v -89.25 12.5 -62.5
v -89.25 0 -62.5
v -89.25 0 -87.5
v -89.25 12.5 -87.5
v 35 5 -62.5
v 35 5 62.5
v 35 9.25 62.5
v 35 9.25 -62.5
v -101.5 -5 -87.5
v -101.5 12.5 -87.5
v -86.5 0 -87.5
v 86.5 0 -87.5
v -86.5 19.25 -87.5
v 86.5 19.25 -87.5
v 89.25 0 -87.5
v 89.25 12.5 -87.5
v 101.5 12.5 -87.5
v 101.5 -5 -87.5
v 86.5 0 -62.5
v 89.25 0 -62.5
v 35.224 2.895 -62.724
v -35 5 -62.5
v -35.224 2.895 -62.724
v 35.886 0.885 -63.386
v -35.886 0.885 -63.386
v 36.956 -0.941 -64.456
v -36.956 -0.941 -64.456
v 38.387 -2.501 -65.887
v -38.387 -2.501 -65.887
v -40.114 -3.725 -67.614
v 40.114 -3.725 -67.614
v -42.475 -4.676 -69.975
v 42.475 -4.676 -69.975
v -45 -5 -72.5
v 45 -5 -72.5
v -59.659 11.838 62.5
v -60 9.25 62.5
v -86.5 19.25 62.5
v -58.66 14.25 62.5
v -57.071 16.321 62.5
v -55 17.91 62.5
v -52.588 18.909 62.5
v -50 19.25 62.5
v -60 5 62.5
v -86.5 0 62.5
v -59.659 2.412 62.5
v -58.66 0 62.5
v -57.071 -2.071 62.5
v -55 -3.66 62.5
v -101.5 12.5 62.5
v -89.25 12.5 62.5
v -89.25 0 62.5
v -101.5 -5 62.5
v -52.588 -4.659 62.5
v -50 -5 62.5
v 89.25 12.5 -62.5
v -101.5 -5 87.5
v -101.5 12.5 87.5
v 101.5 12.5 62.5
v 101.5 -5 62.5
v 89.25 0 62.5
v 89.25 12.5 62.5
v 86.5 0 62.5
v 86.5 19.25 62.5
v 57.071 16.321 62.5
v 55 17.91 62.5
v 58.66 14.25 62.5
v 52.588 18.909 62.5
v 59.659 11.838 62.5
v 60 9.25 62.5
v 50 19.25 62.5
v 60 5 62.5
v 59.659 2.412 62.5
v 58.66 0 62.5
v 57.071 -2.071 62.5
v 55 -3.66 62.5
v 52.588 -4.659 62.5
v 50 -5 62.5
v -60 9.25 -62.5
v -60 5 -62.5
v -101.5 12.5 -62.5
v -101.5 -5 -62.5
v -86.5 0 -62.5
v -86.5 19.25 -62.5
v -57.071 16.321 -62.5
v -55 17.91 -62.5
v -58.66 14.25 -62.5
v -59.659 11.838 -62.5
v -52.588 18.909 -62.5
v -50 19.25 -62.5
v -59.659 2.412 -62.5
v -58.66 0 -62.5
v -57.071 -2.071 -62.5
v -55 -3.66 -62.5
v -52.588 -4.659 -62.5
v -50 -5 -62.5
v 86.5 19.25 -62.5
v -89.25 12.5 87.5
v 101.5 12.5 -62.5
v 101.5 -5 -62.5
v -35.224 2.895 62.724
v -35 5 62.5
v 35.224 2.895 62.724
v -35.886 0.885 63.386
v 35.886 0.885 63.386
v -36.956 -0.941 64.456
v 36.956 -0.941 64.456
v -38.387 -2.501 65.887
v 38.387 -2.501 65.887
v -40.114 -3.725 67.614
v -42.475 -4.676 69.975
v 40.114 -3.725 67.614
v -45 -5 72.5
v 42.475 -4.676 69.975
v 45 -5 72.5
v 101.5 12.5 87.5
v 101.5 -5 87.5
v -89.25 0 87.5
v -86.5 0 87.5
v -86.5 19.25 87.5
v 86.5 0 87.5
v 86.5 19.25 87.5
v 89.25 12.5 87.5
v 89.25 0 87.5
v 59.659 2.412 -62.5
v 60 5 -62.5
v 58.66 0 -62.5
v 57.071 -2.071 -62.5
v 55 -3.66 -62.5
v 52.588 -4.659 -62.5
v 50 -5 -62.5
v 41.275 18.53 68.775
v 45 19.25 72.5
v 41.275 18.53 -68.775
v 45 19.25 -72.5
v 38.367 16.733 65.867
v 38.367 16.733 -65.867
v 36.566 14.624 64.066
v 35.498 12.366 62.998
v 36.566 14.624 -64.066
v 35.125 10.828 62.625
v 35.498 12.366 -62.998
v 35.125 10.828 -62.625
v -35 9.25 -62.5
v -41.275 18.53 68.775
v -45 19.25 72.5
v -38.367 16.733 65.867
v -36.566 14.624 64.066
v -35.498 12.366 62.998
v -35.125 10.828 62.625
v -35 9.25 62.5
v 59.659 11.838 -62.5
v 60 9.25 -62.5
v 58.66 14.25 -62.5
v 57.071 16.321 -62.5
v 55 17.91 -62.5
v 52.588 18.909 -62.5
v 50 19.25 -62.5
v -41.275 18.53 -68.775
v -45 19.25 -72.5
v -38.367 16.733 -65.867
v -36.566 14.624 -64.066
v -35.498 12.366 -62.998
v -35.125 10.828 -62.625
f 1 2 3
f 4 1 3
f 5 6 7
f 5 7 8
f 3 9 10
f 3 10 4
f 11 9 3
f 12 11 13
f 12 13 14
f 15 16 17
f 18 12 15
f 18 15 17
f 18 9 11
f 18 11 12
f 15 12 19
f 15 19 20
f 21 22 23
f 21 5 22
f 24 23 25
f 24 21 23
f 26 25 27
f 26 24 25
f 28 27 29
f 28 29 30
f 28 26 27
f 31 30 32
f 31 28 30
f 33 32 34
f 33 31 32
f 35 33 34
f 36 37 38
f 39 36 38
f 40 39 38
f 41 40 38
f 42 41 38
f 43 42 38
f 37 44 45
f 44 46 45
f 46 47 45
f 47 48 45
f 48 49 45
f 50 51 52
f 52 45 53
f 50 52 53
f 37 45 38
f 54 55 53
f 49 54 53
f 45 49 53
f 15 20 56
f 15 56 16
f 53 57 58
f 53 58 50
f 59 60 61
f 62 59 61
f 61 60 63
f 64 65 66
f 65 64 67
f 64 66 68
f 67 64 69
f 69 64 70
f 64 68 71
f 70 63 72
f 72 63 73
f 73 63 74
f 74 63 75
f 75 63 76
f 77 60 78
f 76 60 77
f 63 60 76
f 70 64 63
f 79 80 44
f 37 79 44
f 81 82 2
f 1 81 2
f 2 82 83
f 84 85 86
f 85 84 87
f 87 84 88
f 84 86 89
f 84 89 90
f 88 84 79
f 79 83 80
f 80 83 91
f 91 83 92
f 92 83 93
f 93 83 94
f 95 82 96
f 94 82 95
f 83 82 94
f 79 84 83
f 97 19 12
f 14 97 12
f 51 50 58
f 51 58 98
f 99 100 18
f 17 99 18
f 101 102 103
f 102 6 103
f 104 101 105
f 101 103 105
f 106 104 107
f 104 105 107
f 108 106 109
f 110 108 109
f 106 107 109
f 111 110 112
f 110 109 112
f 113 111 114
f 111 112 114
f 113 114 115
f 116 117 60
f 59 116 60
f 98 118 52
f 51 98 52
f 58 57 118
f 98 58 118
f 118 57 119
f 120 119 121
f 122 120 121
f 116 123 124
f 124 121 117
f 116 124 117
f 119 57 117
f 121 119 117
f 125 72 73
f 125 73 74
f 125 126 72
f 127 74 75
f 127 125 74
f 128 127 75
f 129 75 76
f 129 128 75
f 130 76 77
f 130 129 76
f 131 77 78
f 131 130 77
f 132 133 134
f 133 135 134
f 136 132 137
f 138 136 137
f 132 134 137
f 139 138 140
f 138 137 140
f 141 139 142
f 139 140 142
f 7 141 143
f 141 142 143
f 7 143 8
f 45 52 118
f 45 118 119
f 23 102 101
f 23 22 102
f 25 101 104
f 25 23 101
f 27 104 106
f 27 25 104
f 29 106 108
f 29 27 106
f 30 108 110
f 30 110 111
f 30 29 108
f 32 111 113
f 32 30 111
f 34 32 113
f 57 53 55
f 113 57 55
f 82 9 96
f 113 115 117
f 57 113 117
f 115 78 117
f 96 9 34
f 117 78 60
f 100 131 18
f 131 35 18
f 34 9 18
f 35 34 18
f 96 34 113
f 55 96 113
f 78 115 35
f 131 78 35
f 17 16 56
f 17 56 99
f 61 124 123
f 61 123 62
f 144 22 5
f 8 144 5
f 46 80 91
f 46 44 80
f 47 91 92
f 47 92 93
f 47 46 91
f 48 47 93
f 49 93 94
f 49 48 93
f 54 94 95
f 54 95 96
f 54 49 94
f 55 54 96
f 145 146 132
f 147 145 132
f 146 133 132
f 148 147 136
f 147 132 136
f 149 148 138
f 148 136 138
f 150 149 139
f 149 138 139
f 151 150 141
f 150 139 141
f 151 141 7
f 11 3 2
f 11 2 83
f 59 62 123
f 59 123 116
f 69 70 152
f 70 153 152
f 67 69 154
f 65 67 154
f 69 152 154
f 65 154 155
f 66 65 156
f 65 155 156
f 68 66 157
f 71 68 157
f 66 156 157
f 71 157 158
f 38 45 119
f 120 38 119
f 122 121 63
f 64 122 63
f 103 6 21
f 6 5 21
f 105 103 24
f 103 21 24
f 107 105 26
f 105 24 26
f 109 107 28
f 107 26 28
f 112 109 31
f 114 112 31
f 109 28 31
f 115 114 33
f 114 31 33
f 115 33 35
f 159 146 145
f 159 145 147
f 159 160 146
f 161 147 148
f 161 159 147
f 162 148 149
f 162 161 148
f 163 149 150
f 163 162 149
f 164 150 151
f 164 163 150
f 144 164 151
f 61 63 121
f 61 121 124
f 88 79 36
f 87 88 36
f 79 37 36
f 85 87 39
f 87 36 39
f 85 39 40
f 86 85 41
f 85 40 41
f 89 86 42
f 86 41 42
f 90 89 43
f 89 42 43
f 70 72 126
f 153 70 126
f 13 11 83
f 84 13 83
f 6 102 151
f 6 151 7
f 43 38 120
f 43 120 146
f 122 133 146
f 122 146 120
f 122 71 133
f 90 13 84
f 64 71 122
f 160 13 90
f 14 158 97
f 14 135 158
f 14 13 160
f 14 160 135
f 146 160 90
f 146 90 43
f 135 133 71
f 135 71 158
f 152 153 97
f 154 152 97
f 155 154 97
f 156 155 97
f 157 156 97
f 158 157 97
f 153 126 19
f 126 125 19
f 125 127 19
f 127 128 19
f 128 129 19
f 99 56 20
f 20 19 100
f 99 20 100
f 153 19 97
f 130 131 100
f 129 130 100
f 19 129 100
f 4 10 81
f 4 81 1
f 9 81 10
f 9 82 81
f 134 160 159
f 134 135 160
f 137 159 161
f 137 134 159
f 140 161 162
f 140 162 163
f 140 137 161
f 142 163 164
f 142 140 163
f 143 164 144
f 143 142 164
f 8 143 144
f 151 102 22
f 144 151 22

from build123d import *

# Parameters (mm, degrees)
BOSS_EXTRUDE1_DEPTH      = 19.25
BOSS_EXTRUDE1_DEPTH_BACK = 5
SKETCH1_W                = 70
SKETCH1_H                = 125
SKETCH2_W                = 15
SKETCH2_H                = 25
BOSS_EXTRUDE2_DEPTH      = 5
SKETCH3_W                = 12.25
SKETCH3_H                = 25
BOSS_EXTRUDE3_DEPTH      = 12.5
FILLET1_R                = 10


with BuildPart() as part:
    # Sketch1 → Boss-Extrude1 (new, two sides: drawn at the far end of the back side and taken through both)
    with BuildSketch(Plane(origin=(0, 0, 0), x_dir=(1, 0, 0), z_dir=(0, 1, 0)).offset(-BOSS_EXTRUDE1_DEPTH_BACK)):
        Polygon((-60, 62.5), (-60, -62.5), (-86.5, -62.5), (-86.5, -87.5), (86.5, -87.5), (86.5, -62.5), (60, -62.5), (60, 62.5), (86.5, 62.5), (86.5, 87.5), (-86.5, 87.5), (-86.5, 62.5), align=None)
        Rectangle(SKETCH1_W, SKETCH1_H, mode=Mode.SUBTRACT)
    extrude(amount=BOSS_EXTRUDE1_DEPTH + BOSS_EXTRUDE1_DEPTH_BACK)

    # Sketch2 → Boss-Extrude2 (add)
    with BuildSketch(Plane(origin=(0, -5, 0), x_dir=(1, 0, 0), z_dir=(0, 1, 0))):
        with Locations((-94, 75)):
            Rectangle(SKETCH2_W, SKETCH2_H)
        with Locations((94, 75)):
            Rectangle(SKETCH2_W, SKETCH2_H)
        with Locations((-94, -75)):
            Rectangle(SKETCH2_W, SKETCH2_H)
        with Locations((94, -75)):
            Rectangle(SKETCH2_W, SKETCH2_H)
    extrude(amount=BOSS_EXTRUDE2_DEPTH)

    # Sketch3 → Boss-Extrude3 (add)
    with BuildSketch(Plane(origin=(0, 0, 0), x_dir=(1, 0, 0), z_dir=(0, 1, 0))):
        with Locations((-95.375, 75)):
            Rectangle(SKETCH3_W, SKETCH3_H)
        with Locations((95.375, 75)):
            Rectangle(SKETCH3_W, SKETCH3_H)
        with Locations((-95.375, -75)):
            Rectangle(SKETCH3_W, SKETCH3_H)
        with Locations((95.375, -75)):
            Rectangle(SKETCH3_W, SKETCH3_H)
    extrude(amount=BOSS_EXTRUDE3_DEPTH)

    # Fillet1
    fillet1_edges = [part.edges().sort_by_distance(p)[0] for p in [
        (0, 19.25, 62.5),
        (60, 19.25, 0),
        (35, 19.25, 0),
        (-60, 19.25, 0),
        (-35, 19.25, 0),
        (0, 19.25, -62.5),
        (0, -5, 62.5),
        (-35, -5, 0),
        (0, -5, -62.5),
        (35, -5, 0),
        (60, -5, 0),
        (-60, -5, 0),
    ]]
    fillet(fillet1_edges, radius=FILLET1_R)


solid = part.part
